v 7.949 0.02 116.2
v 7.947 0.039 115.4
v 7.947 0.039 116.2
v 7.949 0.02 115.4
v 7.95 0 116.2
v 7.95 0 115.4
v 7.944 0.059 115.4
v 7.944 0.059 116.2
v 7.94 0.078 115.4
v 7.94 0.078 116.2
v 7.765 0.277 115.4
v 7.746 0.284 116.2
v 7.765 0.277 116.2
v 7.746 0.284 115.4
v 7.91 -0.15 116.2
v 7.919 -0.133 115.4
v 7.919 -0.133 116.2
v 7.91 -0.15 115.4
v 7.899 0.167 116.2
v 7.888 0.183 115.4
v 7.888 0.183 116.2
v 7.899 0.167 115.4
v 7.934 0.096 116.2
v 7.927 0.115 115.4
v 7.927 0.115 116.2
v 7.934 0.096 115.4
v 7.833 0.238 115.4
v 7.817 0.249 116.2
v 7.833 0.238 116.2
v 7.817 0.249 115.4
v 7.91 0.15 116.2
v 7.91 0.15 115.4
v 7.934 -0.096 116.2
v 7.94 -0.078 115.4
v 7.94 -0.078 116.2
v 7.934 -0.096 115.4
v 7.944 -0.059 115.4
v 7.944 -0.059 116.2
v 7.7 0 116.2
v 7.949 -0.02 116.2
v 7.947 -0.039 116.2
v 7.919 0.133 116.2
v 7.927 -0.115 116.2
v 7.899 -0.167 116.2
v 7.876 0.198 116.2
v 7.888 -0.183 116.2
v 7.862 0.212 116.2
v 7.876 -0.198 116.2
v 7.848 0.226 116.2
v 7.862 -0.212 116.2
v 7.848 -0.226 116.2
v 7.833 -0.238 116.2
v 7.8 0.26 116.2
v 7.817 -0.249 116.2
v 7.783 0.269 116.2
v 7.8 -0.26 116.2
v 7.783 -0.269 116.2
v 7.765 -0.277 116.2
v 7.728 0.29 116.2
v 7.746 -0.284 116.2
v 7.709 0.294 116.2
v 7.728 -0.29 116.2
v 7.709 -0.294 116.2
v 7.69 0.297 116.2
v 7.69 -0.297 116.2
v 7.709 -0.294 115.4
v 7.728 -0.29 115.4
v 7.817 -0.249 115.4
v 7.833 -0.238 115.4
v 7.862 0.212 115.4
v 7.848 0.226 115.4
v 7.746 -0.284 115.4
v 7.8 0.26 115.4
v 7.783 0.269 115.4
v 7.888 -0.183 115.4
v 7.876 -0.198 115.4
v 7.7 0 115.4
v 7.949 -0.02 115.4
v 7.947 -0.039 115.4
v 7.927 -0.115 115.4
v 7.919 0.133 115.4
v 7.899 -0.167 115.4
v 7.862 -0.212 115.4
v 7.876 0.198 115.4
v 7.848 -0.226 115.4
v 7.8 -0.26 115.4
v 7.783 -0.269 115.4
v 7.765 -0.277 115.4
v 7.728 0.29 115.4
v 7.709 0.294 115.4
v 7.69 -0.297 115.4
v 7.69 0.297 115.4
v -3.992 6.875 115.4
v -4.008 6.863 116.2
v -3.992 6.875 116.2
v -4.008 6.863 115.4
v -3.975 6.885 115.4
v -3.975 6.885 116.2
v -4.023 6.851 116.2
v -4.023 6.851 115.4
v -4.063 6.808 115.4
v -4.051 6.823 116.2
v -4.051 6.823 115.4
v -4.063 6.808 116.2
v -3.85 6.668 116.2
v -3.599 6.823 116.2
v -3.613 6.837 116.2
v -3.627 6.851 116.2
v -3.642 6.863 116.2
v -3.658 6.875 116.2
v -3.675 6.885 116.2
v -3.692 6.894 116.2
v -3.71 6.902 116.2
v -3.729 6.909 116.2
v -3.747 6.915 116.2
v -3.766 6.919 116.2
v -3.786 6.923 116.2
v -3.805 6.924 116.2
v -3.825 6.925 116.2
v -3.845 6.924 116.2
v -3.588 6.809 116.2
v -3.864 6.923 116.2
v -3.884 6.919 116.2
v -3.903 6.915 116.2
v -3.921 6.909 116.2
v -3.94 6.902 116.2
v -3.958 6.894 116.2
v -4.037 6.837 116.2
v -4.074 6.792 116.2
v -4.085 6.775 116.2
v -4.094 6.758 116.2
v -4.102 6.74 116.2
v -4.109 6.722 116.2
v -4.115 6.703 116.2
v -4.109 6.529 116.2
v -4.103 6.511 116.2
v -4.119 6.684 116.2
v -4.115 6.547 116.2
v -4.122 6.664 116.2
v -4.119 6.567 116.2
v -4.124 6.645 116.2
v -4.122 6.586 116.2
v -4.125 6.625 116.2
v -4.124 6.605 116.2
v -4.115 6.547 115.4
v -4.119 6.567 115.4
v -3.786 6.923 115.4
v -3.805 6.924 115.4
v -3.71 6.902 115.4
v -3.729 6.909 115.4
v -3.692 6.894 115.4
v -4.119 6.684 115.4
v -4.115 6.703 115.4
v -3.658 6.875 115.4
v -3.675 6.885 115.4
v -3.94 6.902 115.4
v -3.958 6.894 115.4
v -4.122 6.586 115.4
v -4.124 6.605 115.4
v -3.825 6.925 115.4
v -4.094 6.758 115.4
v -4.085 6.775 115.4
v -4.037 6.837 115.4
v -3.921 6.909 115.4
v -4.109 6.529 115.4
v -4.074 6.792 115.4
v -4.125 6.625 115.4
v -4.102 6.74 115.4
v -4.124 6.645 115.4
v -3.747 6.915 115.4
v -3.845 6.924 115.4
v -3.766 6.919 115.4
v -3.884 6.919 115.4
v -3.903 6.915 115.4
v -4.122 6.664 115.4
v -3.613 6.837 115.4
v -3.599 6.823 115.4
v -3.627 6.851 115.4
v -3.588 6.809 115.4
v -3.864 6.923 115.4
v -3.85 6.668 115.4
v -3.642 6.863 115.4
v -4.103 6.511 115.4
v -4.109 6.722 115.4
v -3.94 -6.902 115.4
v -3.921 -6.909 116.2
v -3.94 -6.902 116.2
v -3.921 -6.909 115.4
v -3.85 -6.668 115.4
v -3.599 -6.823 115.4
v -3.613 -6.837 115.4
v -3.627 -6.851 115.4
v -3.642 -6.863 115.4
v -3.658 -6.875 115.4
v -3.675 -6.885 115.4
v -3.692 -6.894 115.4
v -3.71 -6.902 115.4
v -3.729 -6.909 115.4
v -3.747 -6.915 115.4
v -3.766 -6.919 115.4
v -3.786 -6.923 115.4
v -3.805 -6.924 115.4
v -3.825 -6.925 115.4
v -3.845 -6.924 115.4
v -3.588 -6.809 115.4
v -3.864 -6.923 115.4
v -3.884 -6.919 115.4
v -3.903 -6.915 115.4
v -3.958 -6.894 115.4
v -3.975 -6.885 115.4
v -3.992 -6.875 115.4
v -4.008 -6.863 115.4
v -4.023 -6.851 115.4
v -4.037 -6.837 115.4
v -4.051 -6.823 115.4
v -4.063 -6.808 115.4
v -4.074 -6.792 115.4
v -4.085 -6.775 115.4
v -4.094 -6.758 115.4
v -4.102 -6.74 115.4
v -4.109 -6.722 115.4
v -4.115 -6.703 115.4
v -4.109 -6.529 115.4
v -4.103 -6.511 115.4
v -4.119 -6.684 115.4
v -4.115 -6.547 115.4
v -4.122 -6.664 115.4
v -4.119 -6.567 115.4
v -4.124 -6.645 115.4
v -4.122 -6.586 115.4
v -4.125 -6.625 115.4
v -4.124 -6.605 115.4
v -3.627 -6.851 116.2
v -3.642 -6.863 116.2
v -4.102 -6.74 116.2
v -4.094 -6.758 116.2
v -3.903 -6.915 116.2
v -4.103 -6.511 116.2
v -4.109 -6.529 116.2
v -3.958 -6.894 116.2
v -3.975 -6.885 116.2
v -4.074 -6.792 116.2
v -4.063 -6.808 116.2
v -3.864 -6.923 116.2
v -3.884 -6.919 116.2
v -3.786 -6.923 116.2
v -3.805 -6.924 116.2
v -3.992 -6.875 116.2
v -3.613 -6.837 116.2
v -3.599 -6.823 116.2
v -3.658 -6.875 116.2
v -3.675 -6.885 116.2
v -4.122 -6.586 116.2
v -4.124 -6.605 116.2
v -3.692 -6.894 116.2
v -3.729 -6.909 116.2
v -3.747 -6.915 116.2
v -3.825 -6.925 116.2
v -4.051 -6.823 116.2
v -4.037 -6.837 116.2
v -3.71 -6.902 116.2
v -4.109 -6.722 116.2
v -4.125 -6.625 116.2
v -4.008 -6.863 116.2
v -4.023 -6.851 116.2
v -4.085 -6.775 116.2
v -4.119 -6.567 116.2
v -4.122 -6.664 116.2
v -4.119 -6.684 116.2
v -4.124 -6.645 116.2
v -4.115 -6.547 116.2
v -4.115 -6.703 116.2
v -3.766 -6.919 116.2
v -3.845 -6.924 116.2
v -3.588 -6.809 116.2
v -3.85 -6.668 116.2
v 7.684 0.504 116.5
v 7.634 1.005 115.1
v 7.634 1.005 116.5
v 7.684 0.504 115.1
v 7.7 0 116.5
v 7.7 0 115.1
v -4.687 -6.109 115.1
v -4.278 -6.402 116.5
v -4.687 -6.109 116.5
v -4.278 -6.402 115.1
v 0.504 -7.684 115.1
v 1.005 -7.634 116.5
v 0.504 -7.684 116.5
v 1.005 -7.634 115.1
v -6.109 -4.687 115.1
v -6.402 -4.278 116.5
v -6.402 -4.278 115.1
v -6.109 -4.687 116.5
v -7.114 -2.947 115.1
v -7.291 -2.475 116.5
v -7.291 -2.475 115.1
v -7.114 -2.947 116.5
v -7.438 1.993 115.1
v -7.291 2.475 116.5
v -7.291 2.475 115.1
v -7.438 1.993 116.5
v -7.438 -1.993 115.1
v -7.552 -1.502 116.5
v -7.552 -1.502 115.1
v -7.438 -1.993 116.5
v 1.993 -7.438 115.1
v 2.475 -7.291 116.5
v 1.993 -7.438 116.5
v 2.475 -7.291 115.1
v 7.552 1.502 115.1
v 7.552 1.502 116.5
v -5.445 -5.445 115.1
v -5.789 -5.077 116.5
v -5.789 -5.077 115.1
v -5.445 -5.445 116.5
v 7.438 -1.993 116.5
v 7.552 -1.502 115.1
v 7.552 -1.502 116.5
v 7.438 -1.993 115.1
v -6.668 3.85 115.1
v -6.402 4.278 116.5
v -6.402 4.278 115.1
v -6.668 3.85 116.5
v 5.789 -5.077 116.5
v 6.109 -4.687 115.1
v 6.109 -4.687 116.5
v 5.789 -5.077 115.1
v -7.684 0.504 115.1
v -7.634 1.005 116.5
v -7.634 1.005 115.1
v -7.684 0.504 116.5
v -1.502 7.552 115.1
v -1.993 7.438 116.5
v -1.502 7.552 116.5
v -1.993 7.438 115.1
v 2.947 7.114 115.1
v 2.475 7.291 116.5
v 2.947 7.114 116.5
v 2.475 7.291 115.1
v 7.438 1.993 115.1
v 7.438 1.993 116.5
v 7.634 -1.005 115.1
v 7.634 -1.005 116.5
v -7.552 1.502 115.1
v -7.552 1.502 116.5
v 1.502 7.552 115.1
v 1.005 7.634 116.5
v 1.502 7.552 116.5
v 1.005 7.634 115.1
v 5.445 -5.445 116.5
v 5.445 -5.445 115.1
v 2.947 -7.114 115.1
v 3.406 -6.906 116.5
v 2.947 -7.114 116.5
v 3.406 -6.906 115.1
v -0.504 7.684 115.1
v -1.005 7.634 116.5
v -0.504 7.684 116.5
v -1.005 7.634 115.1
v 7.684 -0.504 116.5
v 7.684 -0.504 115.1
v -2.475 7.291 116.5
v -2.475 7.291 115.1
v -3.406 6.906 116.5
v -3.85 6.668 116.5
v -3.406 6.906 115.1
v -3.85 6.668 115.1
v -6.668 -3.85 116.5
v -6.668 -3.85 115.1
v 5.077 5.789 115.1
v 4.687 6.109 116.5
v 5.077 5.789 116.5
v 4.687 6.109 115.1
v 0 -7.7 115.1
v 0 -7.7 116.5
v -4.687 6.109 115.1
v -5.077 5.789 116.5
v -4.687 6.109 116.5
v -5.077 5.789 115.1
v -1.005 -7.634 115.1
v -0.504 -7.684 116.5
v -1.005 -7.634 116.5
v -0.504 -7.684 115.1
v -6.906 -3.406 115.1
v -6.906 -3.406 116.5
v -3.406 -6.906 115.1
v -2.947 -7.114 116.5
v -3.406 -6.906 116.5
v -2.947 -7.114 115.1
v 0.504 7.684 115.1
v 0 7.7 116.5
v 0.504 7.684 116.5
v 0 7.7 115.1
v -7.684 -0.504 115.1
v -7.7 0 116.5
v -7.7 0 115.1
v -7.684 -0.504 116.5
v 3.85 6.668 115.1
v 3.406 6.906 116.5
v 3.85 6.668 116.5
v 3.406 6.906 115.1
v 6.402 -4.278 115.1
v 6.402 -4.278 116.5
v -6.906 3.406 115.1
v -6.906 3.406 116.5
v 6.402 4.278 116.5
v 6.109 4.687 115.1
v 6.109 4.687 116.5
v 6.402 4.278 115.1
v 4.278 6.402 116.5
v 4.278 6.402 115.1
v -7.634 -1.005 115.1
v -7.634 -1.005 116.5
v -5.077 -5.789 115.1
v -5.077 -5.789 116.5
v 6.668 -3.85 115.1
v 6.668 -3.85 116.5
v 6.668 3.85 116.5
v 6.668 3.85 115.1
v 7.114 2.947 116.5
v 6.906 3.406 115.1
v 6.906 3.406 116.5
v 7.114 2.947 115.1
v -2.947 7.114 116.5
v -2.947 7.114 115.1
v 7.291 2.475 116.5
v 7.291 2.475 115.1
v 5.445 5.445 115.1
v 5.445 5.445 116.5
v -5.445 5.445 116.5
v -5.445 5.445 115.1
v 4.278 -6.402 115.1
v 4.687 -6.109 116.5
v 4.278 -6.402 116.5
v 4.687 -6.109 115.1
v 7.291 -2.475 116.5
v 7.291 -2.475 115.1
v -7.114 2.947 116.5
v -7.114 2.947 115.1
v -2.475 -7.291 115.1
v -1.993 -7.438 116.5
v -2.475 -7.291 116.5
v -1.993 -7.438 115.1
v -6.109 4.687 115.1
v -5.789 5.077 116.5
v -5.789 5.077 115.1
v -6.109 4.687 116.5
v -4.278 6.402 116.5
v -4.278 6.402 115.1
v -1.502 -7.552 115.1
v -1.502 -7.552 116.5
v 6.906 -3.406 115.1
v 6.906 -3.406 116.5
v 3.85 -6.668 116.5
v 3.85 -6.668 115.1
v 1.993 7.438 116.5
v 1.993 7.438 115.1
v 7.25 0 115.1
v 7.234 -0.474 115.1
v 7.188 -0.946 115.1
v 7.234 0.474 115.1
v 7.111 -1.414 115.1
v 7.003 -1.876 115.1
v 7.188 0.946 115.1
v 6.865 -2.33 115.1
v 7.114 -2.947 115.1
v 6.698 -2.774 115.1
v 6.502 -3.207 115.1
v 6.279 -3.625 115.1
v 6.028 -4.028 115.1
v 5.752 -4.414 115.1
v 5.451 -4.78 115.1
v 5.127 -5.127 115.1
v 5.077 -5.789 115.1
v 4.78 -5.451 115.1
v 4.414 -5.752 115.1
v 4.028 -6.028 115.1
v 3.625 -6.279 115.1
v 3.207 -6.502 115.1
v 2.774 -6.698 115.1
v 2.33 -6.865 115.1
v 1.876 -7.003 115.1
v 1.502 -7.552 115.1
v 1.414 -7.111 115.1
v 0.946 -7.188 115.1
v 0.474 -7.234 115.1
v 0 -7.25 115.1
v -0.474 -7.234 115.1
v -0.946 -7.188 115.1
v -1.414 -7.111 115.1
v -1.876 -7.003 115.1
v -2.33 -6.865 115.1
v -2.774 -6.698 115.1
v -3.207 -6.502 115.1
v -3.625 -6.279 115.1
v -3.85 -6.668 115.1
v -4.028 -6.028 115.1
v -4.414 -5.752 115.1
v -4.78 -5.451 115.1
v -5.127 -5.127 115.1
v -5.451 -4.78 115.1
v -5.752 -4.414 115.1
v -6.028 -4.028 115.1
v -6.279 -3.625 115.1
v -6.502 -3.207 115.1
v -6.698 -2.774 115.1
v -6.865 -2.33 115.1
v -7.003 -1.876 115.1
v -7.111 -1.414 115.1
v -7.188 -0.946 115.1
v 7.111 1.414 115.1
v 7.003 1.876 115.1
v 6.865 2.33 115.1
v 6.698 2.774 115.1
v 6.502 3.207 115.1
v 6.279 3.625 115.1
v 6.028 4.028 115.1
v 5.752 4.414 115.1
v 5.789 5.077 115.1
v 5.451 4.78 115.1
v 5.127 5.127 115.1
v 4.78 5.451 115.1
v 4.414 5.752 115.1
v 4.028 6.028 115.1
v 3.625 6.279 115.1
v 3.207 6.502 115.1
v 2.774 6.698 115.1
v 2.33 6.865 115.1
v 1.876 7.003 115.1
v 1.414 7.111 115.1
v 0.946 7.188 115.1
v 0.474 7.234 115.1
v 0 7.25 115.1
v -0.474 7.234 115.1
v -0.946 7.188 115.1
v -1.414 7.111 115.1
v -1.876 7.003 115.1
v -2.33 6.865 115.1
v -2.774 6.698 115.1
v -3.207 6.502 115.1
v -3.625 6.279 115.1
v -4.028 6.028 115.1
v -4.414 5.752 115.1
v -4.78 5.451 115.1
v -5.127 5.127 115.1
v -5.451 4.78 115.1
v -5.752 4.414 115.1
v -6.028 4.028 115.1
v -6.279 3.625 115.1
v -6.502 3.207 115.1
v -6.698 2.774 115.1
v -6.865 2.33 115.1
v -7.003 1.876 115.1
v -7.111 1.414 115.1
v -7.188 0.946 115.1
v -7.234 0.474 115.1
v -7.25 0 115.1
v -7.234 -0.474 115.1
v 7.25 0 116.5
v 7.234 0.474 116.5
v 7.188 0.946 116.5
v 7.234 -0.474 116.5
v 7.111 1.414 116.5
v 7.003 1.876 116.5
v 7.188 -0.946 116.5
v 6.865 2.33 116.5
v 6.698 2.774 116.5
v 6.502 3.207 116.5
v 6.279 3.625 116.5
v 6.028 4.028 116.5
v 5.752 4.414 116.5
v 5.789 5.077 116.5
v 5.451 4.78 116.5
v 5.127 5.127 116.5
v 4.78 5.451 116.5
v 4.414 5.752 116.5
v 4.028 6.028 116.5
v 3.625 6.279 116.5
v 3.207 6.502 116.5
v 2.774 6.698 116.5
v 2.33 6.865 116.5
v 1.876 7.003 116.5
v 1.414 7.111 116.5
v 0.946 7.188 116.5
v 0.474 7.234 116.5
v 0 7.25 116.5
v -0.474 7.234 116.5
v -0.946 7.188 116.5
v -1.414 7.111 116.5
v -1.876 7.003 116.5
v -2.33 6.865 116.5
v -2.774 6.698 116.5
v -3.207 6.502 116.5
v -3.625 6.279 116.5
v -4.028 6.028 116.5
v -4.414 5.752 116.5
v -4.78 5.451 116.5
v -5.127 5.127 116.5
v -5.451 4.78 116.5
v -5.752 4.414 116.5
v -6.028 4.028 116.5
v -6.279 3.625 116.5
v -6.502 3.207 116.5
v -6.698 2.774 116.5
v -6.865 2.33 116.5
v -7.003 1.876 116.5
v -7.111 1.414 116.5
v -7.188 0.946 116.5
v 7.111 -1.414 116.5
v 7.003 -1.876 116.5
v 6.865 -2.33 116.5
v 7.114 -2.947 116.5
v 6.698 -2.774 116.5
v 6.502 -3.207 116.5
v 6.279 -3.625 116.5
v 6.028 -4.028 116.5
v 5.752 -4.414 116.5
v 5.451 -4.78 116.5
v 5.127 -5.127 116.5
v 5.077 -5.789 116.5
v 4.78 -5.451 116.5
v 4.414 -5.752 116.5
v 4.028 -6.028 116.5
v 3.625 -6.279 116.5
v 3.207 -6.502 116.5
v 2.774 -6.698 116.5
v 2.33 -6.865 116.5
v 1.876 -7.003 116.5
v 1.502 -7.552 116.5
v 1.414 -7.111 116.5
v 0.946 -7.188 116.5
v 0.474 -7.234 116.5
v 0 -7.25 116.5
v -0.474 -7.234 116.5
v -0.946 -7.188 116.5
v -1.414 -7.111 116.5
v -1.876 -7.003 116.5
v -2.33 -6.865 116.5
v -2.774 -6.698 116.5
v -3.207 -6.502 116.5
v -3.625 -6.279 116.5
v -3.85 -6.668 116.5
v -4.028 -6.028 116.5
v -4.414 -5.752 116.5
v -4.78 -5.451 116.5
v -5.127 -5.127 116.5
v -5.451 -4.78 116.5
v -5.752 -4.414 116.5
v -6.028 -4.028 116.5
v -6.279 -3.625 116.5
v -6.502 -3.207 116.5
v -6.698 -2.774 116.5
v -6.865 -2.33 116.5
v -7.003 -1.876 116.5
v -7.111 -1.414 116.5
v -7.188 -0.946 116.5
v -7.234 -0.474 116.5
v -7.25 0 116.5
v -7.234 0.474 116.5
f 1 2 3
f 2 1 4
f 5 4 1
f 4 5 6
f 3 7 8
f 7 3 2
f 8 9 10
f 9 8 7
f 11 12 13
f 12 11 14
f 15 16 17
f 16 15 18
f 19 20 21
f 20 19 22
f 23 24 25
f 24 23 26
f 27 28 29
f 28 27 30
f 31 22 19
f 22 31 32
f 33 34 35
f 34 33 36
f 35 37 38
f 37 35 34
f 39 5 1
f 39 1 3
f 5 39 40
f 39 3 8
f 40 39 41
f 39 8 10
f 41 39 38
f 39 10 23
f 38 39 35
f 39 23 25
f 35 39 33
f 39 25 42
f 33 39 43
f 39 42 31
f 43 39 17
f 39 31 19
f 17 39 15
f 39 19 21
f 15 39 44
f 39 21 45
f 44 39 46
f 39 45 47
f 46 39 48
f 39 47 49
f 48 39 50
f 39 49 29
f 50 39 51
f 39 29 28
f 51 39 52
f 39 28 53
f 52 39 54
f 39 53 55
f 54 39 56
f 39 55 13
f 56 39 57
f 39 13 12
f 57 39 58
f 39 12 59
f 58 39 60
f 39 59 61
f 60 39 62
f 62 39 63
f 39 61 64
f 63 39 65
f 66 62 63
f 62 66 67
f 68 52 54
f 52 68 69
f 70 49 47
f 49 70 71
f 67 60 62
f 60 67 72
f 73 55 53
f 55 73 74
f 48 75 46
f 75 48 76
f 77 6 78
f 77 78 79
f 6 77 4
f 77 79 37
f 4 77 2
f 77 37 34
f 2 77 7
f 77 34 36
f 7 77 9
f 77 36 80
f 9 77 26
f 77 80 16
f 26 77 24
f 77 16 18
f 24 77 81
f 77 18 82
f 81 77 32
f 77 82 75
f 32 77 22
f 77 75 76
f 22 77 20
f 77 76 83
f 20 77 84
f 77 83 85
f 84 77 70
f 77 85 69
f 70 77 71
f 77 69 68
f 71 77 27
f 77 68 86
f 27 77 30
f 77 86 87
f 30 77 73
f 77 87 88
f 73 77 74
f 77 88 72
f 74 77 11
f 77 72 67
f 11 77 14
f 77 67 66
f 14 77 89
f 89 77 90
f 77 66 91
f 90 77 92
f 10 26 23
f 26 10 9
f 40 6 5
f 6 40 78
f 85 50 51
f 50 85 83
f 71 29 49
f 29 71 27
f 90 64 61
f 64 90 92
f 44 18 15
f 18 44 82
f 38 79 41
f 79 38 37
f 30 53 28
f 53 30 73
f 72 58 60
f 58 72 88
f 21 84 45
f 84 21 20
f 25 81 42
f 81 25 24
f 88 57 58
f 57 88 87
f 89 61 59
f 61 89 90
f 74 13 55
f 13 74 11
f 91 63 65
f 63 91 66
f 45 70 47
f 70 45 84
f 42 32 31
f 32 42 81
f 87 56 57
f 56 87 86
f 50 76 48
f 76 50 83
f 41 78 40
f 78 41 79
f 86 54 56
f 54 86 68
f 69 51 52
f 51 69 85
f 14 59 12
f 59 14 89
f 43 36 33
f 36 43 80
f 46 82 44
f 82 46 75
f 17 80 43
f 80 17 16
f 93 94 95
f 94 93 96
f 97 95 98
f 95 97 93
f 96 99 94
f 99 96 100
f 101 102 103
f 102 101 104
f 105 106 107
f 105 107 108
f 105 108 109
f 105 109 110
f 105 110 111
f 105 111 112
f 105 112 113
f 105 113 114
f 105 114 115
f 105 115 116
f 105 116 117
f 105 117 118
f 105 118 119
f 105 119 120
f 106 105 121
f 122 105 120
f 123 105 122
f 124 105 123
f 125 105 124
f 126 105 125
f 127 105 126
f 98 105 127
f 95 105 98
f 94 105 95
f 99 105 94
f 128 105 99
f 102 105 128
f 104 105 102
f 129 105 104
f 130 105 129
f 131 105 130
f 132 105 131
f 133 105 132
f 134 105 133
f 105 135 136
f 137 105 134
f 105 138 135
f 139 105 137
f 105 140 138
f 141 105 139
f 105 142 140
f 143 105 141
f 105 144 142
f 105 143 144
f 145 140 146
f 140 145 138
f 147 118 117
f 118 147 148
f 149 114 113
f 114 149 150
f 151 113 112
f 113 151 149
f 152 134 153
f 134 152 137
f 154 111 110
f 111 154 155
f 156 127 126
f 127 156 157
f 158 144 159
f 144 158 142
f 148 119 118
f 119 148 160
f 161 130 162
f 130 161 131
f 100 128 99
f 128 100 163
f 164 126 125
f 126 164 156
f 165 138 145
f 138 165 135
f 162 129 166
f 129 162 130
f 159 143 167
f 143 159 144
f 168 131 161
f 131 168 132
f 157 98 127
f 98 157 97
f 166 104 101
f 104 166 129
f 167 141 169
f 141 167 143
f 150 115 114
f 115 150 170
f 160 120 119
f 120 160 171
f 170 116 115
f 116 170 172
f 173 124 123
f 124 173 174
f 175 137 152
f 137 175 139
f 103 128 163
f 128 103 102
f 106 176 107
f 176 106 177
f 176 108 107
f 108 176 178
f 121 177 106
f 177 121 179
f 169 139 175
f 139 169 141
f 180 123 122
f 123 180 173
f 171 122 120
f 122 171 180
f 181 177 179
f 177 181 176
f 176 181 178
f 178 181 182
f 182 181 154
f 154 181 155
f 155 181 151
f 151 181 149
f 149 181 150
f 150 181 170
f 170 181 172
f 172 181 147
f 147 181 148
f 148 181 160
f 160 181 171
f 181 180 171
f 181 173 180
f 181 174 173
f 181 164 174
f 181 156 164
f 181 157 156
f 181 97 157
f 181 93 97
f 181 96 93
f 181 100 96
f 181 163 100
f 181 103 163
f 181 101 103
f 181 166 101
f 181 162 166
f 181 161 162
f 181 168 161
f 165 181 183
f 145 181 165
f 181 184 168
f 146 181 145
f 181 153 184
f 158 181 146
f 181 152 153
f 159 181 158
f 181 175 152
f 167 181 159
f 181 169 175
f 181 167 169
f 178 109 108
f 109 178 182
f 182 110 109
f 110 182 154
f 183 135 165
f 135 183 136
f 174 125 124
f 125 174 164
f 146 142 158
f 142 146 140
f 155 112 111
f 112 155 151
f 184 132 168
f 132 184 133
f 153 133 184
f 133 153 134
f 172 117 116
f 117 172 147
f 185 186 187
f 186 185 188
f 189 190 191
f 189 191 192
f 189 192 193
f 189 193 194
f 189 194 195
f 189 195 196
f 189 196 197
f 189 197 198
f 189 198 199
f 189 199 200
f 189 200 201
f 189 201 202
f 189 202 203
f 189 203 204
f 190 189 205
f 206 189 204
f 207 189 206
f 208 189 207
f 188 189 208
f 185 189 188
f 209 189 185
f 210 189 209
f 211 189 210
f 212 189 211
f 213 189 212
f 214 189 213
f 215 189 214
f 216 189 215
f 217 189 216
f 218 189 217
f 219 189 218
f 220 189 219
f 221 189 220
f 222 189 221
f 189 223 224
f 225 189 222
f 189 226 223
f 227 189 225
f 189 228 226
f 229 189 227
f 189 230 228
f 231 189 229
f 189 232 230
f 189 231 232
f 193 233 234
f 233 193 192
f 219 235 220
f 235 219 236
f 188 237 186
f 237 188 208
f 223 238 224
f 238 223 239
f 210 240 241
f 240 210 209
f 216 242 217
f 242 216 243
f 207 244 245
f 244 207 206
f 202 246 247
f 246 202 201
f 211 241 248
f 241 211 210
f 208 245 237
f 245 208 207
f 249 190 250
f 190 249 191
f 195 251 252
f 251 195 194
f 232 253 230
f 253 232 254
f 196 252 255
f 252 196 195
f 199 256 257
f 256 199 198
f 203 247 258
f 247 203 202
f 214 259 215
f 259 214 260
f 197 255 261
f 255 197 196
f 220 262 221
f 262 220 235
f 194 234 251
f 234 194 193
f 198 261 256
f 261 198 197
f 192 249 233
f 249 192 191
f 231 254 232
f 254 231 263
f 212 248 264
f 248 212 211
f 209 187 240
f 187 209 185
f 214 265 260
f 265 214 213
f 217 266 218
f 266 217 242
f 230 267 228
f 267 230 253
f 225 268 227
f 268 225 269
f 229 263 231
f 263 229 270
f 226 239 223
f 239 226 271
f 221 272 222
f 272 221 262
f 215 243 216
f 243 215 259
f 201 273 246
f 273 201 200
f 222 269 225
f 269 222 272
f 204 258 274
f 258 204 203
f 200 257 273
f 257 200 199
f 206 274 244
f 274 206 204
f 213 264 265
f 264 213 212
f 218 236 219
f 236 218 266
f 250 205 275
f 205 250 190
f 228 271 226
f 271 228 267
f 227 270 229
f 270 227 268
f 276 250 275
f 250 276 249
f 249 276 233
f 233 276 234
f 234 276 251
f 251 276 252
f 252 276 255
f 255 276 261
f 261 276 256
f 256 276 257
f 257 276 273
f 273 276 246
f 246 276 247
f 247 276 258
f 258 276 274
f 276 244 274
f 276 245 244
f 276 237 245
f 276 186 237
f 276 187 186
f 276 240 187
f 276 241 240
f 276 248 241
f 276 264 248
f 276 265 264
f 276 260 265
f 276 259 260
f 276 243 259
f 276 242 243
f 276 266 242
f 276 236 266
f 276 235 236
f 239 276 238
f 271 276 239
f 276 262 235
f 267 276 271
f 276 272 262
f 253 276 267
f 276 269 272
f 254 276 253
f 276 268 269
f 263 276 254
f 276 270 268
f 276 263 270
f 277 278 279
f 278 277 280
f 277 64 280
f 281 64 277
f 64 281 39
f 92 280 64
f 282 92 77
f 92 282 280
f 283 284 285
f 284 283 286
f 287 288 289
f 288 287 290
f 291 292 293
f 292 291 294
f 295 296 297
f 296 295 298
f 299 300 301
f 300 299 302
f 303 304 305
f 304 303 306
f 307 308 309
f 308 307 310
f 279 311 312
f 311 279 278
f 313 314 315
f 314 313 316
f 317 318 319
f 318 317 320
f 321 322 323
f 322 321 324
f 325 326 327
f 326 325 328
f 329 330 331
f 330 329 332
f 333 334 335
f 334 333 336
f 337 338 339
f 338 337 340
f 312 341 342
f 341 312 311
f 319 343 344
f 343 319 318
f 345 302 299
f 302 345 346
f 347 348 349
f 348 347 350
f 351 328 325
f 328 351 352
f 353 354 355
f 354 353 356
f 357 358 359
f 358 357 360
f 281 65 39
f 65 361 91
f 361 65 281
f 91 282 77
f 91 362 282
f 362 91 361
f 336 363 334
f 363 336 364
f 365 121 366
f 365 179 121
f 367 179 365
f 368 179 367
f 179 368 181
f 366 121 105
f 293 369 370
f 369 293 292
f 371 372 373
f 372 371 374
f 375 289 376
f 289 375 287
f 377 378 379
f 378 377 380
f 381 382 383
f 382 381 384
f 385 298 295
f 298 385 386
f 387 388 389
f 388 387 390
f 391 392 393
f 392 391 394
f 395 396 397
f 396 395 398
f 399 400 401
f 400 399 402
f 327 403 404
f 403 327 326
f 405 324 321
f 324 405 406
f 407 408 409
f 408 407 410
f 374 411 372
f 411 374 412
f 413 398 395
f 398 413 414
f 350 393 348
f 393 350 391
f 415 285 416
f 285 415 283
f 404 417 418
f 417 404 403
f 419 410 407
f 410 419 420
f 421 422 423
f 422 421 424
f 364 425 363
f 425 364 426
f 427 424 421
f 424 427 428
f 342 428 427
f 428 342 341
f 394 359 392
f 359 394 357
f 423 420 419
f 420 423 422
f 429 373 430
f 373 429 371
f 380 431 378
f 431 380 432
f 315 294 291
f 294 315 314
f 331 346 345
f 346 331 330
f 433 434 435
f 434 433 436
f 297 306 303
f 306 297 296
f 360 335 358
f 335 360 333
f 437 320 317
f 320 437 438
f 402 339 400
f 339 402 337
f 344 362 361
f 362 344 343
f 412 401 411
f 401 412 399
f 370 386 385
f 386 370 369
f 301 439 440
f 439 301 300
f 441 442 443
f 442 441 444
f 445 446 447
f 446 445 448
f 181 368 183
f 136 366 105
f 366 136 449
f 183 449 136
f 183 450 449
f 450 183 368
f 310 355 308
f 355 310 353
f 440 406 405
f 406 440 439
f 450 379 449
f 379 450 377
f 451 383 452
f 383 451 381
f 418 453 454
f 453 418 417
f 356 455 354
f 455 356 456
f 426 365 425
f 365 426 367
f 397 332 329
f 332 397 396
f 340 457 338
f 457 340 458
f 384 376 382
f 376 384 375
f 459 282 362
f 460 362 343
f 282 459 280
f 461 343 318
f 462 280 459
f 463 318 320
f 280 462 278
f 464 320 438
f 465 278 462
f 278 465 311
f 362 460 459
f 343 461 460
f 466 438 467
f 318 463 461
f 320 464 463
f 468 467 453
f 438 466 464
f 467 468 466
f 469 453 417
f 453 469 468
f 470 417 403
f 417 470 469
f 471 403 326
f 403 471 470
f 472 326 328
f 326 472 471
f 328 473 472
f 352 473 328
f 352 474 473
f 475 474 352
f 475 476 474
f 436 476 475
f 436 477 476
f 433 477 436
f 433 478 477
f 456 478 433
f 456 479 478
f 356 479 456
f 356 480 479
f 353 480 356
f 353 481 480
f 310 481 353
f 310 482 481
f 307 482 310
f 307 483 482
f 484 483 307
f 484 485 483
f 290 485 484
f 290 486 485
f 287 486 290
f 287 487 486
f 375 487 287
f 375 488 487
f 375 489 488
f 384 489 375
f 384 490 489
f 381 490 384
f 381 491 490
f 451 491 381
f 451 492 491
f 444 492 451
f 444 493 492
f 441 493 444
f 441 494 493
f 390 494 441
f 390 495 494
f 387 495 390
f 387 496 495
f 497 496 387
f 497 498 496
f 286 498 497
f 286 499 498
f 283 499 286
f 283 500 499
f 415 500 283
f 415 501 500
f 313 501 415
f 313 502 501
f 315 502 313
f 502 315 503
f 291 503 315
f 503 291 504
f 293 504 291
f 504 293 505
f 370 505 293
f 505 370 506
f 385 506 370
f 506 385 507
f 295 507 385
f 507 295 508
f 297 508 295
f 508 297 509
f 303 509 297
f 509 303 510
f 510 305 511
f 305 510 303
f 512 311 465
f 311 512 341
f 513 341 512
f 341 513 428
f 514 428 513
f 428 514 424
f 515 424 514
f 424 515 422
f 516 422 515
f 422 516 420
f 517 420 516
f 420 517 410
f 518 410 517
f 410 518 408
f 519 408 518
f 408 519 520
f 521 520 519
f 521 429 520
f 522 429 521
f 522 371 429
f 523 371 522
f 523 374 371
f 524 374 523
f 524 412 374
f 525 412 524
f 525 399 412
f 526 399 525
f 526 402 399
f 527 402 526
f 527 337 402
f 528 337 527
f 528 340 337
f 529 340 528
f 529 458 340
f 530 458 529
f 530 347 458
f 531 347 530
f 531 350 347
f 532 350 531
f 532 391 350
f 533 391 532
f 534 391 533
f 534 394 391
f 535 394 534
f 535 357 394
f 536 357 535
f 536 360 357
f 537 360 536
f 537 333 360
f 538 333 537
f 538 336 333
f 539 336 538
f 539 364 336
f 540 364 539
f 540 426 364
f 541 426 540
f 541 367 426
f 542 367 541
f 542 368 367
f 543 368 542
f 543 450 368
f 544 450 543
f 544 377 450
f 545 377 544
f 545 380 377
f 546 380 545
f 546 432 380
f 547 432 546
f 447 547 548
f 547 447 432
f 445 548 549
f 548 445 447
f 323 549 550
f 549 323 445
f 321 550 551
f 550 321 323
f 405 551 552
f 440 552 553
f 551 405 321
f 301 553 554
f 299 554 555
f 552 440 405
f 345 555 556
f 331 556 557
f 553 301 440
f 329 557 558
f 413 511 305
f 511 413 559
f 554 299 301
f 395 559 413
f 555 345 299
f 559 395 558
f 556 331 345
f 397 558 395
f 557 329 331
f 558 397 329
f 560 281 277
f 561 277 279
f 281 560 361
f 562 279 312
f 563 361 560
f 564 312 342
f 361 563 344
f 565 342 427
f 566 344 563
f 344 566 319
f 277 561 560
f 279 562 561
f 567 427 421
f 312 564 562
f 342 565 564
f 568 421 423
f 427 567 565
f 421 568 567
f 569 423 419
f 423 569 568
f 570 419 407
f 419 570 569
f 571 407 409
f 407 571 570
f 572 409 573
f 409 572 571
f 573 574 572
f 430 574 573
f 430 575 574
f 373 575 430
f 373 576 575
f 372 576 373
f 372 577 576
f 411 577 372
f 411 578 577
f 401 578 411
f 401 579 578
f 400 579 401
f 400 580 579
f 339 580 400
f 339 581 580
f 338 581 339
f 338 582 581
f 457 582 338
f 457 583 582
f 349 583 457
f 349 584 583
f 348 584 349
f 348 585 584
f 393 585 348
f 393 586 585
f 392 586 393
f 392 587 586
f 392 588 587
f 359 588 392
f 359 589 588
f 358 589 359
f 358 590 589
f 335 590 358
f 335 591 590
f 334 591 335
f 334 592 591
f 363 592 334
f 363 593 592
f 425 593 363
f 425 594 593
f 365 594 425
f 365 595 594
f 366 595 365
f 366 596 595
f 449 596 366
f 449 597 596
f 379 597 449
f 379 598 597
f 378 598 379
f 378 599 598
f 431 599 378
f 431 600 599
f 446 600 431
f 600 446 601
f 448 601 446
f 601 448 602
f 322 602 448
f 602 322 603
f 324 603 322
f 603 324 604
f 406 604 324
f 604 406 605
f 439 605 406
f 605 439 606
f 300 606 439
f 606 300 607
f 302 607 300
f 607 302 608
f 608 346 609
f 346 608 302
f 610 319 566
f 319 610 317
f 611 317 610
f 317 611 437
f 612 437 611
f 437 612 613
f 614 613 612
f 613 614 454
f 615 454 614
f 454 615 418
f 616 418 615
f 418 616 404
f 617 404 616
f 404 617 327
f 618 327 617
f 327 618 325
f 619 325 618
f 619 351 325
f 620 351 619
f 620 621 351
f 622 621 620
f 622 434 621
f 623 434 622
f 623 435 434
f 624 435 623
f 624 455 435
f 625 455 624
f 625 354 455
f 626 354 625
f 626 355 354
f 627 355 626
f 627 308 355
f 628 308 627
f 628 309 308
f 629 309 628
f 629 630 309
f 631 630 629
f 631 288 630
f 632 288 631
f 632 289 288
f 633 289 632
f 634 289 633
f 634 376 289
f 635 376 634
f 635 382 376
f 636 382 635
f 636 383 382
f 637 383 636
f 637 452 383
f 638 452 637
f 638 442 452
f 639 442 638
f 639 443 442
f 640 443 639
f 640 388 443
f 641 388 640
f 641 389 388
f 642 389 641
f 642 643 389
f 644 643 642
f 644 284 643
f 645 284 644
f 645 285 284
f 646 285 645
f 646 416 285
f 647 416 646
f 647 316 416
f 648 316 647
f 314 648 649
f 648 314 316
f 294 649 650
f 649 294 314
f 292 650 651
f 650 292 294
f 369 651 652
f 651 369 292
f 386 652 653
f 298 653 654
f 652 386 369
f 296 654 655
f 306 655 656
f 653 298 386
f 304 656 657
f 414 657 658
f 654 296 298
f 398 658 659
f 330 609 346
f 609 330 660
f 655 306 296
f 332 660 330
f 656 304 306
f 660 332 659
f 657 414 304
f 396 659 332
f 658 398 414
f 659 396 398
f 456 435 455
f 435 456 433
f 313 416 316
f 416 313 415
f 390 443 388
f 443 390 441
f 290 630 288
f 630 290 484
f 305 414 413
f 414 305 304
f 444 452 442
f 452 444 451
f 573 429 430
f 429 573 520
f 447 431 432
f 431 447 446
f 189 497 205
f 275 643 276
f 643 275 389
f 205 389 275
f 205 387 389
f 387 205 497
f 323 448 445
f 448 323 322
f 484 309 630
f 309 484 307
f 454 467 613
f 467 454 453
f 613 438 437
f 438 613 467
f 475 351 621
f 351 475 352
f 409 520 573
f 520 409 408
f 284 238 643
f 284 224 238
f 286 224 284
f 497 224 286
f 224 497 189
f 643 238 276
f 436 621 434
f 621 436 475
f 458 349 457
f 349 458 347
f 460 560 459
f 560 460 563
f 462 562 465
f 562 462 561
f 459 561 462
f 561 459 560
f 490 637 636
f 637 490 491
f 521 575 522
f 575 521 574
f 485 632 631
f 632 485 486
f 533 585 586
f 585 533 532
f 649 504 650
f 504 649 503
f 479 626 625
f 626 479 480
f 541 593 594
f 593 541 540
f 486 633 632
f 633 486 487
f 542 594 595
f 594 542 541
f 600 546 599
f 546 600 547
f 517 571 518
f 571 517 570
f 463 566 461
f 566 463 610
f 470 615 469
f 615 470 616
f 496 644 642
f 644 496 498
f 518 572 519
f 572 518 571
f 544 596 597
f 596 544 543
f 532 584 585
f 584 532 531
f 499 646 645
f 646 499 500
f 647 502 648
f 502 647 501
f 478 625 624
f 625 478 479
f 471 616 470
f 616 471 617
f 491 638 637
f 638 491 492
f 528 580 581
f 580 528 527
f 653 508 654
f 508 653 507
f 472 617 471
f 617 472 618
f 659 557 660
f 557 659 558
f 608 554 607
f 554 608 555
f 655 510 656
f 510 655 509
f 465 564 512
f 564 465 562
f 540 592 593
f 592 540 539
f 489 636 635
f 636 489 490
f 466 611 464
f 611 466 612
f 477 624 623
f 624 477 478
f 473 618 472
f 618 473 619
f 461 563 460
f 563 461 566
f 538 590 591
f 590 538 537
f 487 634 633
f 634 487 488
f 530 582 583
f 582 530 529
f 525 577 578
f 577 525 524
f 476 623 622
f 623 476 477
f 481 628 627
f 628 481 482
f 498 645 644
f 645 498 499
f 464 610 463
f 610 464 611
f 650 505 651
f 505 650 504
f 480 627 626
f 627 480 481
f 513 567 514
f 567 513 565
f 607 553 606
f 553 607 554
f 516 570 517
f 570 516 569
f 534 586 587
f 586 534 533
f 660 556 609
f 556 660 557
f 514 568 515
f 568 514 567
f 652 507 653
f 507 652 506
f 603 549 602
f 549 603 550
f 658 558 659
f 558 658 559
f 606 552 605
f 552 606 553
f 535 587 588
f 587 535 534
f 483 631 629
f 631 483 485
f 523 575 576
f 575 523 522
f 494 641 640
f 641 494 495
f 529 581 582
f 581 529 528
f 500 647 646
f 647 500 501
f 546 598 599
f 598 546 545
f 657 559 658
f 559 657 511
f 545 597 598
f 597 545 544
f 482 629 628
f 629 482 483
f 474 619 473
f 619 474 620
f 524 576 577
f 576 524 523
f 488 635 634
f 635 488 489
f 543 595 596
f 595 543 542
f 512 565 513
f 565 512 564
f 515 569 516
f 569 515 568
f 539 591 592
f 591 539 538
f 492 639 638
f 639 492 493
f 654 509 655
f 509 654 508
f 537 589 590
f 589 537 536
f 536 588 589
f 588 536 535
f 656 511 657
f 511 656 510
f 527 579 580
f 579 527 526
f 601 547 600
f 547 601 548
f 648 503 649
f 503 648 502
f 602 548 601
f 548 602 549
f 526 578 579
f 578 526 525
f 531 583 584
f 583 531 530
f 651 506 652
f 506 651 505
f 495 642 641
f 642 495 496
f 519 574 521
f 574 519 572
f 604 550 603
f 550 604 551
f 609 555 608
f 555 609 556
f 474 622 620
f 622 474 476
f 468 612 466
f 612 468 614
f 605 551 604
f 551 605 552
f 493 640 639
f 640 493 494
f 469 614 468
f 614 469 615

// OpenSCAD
$fn = 96;
// Rotor retainer v2: under the 116.5 top plate.
difference() {
    union() {
        translate([0,0,115.1]) cylinder(h=1.4, r=7.70, center=false);
        for (k=[0:2])
            rotate([0,0,k*120])
                translate([7.65,0,115.4]) cylinder(h=0.8, r=0.30, center=false);
    }
    translate([0,0,115.0]) cylinder(h=1.6, r=7.25, center=false);
}
